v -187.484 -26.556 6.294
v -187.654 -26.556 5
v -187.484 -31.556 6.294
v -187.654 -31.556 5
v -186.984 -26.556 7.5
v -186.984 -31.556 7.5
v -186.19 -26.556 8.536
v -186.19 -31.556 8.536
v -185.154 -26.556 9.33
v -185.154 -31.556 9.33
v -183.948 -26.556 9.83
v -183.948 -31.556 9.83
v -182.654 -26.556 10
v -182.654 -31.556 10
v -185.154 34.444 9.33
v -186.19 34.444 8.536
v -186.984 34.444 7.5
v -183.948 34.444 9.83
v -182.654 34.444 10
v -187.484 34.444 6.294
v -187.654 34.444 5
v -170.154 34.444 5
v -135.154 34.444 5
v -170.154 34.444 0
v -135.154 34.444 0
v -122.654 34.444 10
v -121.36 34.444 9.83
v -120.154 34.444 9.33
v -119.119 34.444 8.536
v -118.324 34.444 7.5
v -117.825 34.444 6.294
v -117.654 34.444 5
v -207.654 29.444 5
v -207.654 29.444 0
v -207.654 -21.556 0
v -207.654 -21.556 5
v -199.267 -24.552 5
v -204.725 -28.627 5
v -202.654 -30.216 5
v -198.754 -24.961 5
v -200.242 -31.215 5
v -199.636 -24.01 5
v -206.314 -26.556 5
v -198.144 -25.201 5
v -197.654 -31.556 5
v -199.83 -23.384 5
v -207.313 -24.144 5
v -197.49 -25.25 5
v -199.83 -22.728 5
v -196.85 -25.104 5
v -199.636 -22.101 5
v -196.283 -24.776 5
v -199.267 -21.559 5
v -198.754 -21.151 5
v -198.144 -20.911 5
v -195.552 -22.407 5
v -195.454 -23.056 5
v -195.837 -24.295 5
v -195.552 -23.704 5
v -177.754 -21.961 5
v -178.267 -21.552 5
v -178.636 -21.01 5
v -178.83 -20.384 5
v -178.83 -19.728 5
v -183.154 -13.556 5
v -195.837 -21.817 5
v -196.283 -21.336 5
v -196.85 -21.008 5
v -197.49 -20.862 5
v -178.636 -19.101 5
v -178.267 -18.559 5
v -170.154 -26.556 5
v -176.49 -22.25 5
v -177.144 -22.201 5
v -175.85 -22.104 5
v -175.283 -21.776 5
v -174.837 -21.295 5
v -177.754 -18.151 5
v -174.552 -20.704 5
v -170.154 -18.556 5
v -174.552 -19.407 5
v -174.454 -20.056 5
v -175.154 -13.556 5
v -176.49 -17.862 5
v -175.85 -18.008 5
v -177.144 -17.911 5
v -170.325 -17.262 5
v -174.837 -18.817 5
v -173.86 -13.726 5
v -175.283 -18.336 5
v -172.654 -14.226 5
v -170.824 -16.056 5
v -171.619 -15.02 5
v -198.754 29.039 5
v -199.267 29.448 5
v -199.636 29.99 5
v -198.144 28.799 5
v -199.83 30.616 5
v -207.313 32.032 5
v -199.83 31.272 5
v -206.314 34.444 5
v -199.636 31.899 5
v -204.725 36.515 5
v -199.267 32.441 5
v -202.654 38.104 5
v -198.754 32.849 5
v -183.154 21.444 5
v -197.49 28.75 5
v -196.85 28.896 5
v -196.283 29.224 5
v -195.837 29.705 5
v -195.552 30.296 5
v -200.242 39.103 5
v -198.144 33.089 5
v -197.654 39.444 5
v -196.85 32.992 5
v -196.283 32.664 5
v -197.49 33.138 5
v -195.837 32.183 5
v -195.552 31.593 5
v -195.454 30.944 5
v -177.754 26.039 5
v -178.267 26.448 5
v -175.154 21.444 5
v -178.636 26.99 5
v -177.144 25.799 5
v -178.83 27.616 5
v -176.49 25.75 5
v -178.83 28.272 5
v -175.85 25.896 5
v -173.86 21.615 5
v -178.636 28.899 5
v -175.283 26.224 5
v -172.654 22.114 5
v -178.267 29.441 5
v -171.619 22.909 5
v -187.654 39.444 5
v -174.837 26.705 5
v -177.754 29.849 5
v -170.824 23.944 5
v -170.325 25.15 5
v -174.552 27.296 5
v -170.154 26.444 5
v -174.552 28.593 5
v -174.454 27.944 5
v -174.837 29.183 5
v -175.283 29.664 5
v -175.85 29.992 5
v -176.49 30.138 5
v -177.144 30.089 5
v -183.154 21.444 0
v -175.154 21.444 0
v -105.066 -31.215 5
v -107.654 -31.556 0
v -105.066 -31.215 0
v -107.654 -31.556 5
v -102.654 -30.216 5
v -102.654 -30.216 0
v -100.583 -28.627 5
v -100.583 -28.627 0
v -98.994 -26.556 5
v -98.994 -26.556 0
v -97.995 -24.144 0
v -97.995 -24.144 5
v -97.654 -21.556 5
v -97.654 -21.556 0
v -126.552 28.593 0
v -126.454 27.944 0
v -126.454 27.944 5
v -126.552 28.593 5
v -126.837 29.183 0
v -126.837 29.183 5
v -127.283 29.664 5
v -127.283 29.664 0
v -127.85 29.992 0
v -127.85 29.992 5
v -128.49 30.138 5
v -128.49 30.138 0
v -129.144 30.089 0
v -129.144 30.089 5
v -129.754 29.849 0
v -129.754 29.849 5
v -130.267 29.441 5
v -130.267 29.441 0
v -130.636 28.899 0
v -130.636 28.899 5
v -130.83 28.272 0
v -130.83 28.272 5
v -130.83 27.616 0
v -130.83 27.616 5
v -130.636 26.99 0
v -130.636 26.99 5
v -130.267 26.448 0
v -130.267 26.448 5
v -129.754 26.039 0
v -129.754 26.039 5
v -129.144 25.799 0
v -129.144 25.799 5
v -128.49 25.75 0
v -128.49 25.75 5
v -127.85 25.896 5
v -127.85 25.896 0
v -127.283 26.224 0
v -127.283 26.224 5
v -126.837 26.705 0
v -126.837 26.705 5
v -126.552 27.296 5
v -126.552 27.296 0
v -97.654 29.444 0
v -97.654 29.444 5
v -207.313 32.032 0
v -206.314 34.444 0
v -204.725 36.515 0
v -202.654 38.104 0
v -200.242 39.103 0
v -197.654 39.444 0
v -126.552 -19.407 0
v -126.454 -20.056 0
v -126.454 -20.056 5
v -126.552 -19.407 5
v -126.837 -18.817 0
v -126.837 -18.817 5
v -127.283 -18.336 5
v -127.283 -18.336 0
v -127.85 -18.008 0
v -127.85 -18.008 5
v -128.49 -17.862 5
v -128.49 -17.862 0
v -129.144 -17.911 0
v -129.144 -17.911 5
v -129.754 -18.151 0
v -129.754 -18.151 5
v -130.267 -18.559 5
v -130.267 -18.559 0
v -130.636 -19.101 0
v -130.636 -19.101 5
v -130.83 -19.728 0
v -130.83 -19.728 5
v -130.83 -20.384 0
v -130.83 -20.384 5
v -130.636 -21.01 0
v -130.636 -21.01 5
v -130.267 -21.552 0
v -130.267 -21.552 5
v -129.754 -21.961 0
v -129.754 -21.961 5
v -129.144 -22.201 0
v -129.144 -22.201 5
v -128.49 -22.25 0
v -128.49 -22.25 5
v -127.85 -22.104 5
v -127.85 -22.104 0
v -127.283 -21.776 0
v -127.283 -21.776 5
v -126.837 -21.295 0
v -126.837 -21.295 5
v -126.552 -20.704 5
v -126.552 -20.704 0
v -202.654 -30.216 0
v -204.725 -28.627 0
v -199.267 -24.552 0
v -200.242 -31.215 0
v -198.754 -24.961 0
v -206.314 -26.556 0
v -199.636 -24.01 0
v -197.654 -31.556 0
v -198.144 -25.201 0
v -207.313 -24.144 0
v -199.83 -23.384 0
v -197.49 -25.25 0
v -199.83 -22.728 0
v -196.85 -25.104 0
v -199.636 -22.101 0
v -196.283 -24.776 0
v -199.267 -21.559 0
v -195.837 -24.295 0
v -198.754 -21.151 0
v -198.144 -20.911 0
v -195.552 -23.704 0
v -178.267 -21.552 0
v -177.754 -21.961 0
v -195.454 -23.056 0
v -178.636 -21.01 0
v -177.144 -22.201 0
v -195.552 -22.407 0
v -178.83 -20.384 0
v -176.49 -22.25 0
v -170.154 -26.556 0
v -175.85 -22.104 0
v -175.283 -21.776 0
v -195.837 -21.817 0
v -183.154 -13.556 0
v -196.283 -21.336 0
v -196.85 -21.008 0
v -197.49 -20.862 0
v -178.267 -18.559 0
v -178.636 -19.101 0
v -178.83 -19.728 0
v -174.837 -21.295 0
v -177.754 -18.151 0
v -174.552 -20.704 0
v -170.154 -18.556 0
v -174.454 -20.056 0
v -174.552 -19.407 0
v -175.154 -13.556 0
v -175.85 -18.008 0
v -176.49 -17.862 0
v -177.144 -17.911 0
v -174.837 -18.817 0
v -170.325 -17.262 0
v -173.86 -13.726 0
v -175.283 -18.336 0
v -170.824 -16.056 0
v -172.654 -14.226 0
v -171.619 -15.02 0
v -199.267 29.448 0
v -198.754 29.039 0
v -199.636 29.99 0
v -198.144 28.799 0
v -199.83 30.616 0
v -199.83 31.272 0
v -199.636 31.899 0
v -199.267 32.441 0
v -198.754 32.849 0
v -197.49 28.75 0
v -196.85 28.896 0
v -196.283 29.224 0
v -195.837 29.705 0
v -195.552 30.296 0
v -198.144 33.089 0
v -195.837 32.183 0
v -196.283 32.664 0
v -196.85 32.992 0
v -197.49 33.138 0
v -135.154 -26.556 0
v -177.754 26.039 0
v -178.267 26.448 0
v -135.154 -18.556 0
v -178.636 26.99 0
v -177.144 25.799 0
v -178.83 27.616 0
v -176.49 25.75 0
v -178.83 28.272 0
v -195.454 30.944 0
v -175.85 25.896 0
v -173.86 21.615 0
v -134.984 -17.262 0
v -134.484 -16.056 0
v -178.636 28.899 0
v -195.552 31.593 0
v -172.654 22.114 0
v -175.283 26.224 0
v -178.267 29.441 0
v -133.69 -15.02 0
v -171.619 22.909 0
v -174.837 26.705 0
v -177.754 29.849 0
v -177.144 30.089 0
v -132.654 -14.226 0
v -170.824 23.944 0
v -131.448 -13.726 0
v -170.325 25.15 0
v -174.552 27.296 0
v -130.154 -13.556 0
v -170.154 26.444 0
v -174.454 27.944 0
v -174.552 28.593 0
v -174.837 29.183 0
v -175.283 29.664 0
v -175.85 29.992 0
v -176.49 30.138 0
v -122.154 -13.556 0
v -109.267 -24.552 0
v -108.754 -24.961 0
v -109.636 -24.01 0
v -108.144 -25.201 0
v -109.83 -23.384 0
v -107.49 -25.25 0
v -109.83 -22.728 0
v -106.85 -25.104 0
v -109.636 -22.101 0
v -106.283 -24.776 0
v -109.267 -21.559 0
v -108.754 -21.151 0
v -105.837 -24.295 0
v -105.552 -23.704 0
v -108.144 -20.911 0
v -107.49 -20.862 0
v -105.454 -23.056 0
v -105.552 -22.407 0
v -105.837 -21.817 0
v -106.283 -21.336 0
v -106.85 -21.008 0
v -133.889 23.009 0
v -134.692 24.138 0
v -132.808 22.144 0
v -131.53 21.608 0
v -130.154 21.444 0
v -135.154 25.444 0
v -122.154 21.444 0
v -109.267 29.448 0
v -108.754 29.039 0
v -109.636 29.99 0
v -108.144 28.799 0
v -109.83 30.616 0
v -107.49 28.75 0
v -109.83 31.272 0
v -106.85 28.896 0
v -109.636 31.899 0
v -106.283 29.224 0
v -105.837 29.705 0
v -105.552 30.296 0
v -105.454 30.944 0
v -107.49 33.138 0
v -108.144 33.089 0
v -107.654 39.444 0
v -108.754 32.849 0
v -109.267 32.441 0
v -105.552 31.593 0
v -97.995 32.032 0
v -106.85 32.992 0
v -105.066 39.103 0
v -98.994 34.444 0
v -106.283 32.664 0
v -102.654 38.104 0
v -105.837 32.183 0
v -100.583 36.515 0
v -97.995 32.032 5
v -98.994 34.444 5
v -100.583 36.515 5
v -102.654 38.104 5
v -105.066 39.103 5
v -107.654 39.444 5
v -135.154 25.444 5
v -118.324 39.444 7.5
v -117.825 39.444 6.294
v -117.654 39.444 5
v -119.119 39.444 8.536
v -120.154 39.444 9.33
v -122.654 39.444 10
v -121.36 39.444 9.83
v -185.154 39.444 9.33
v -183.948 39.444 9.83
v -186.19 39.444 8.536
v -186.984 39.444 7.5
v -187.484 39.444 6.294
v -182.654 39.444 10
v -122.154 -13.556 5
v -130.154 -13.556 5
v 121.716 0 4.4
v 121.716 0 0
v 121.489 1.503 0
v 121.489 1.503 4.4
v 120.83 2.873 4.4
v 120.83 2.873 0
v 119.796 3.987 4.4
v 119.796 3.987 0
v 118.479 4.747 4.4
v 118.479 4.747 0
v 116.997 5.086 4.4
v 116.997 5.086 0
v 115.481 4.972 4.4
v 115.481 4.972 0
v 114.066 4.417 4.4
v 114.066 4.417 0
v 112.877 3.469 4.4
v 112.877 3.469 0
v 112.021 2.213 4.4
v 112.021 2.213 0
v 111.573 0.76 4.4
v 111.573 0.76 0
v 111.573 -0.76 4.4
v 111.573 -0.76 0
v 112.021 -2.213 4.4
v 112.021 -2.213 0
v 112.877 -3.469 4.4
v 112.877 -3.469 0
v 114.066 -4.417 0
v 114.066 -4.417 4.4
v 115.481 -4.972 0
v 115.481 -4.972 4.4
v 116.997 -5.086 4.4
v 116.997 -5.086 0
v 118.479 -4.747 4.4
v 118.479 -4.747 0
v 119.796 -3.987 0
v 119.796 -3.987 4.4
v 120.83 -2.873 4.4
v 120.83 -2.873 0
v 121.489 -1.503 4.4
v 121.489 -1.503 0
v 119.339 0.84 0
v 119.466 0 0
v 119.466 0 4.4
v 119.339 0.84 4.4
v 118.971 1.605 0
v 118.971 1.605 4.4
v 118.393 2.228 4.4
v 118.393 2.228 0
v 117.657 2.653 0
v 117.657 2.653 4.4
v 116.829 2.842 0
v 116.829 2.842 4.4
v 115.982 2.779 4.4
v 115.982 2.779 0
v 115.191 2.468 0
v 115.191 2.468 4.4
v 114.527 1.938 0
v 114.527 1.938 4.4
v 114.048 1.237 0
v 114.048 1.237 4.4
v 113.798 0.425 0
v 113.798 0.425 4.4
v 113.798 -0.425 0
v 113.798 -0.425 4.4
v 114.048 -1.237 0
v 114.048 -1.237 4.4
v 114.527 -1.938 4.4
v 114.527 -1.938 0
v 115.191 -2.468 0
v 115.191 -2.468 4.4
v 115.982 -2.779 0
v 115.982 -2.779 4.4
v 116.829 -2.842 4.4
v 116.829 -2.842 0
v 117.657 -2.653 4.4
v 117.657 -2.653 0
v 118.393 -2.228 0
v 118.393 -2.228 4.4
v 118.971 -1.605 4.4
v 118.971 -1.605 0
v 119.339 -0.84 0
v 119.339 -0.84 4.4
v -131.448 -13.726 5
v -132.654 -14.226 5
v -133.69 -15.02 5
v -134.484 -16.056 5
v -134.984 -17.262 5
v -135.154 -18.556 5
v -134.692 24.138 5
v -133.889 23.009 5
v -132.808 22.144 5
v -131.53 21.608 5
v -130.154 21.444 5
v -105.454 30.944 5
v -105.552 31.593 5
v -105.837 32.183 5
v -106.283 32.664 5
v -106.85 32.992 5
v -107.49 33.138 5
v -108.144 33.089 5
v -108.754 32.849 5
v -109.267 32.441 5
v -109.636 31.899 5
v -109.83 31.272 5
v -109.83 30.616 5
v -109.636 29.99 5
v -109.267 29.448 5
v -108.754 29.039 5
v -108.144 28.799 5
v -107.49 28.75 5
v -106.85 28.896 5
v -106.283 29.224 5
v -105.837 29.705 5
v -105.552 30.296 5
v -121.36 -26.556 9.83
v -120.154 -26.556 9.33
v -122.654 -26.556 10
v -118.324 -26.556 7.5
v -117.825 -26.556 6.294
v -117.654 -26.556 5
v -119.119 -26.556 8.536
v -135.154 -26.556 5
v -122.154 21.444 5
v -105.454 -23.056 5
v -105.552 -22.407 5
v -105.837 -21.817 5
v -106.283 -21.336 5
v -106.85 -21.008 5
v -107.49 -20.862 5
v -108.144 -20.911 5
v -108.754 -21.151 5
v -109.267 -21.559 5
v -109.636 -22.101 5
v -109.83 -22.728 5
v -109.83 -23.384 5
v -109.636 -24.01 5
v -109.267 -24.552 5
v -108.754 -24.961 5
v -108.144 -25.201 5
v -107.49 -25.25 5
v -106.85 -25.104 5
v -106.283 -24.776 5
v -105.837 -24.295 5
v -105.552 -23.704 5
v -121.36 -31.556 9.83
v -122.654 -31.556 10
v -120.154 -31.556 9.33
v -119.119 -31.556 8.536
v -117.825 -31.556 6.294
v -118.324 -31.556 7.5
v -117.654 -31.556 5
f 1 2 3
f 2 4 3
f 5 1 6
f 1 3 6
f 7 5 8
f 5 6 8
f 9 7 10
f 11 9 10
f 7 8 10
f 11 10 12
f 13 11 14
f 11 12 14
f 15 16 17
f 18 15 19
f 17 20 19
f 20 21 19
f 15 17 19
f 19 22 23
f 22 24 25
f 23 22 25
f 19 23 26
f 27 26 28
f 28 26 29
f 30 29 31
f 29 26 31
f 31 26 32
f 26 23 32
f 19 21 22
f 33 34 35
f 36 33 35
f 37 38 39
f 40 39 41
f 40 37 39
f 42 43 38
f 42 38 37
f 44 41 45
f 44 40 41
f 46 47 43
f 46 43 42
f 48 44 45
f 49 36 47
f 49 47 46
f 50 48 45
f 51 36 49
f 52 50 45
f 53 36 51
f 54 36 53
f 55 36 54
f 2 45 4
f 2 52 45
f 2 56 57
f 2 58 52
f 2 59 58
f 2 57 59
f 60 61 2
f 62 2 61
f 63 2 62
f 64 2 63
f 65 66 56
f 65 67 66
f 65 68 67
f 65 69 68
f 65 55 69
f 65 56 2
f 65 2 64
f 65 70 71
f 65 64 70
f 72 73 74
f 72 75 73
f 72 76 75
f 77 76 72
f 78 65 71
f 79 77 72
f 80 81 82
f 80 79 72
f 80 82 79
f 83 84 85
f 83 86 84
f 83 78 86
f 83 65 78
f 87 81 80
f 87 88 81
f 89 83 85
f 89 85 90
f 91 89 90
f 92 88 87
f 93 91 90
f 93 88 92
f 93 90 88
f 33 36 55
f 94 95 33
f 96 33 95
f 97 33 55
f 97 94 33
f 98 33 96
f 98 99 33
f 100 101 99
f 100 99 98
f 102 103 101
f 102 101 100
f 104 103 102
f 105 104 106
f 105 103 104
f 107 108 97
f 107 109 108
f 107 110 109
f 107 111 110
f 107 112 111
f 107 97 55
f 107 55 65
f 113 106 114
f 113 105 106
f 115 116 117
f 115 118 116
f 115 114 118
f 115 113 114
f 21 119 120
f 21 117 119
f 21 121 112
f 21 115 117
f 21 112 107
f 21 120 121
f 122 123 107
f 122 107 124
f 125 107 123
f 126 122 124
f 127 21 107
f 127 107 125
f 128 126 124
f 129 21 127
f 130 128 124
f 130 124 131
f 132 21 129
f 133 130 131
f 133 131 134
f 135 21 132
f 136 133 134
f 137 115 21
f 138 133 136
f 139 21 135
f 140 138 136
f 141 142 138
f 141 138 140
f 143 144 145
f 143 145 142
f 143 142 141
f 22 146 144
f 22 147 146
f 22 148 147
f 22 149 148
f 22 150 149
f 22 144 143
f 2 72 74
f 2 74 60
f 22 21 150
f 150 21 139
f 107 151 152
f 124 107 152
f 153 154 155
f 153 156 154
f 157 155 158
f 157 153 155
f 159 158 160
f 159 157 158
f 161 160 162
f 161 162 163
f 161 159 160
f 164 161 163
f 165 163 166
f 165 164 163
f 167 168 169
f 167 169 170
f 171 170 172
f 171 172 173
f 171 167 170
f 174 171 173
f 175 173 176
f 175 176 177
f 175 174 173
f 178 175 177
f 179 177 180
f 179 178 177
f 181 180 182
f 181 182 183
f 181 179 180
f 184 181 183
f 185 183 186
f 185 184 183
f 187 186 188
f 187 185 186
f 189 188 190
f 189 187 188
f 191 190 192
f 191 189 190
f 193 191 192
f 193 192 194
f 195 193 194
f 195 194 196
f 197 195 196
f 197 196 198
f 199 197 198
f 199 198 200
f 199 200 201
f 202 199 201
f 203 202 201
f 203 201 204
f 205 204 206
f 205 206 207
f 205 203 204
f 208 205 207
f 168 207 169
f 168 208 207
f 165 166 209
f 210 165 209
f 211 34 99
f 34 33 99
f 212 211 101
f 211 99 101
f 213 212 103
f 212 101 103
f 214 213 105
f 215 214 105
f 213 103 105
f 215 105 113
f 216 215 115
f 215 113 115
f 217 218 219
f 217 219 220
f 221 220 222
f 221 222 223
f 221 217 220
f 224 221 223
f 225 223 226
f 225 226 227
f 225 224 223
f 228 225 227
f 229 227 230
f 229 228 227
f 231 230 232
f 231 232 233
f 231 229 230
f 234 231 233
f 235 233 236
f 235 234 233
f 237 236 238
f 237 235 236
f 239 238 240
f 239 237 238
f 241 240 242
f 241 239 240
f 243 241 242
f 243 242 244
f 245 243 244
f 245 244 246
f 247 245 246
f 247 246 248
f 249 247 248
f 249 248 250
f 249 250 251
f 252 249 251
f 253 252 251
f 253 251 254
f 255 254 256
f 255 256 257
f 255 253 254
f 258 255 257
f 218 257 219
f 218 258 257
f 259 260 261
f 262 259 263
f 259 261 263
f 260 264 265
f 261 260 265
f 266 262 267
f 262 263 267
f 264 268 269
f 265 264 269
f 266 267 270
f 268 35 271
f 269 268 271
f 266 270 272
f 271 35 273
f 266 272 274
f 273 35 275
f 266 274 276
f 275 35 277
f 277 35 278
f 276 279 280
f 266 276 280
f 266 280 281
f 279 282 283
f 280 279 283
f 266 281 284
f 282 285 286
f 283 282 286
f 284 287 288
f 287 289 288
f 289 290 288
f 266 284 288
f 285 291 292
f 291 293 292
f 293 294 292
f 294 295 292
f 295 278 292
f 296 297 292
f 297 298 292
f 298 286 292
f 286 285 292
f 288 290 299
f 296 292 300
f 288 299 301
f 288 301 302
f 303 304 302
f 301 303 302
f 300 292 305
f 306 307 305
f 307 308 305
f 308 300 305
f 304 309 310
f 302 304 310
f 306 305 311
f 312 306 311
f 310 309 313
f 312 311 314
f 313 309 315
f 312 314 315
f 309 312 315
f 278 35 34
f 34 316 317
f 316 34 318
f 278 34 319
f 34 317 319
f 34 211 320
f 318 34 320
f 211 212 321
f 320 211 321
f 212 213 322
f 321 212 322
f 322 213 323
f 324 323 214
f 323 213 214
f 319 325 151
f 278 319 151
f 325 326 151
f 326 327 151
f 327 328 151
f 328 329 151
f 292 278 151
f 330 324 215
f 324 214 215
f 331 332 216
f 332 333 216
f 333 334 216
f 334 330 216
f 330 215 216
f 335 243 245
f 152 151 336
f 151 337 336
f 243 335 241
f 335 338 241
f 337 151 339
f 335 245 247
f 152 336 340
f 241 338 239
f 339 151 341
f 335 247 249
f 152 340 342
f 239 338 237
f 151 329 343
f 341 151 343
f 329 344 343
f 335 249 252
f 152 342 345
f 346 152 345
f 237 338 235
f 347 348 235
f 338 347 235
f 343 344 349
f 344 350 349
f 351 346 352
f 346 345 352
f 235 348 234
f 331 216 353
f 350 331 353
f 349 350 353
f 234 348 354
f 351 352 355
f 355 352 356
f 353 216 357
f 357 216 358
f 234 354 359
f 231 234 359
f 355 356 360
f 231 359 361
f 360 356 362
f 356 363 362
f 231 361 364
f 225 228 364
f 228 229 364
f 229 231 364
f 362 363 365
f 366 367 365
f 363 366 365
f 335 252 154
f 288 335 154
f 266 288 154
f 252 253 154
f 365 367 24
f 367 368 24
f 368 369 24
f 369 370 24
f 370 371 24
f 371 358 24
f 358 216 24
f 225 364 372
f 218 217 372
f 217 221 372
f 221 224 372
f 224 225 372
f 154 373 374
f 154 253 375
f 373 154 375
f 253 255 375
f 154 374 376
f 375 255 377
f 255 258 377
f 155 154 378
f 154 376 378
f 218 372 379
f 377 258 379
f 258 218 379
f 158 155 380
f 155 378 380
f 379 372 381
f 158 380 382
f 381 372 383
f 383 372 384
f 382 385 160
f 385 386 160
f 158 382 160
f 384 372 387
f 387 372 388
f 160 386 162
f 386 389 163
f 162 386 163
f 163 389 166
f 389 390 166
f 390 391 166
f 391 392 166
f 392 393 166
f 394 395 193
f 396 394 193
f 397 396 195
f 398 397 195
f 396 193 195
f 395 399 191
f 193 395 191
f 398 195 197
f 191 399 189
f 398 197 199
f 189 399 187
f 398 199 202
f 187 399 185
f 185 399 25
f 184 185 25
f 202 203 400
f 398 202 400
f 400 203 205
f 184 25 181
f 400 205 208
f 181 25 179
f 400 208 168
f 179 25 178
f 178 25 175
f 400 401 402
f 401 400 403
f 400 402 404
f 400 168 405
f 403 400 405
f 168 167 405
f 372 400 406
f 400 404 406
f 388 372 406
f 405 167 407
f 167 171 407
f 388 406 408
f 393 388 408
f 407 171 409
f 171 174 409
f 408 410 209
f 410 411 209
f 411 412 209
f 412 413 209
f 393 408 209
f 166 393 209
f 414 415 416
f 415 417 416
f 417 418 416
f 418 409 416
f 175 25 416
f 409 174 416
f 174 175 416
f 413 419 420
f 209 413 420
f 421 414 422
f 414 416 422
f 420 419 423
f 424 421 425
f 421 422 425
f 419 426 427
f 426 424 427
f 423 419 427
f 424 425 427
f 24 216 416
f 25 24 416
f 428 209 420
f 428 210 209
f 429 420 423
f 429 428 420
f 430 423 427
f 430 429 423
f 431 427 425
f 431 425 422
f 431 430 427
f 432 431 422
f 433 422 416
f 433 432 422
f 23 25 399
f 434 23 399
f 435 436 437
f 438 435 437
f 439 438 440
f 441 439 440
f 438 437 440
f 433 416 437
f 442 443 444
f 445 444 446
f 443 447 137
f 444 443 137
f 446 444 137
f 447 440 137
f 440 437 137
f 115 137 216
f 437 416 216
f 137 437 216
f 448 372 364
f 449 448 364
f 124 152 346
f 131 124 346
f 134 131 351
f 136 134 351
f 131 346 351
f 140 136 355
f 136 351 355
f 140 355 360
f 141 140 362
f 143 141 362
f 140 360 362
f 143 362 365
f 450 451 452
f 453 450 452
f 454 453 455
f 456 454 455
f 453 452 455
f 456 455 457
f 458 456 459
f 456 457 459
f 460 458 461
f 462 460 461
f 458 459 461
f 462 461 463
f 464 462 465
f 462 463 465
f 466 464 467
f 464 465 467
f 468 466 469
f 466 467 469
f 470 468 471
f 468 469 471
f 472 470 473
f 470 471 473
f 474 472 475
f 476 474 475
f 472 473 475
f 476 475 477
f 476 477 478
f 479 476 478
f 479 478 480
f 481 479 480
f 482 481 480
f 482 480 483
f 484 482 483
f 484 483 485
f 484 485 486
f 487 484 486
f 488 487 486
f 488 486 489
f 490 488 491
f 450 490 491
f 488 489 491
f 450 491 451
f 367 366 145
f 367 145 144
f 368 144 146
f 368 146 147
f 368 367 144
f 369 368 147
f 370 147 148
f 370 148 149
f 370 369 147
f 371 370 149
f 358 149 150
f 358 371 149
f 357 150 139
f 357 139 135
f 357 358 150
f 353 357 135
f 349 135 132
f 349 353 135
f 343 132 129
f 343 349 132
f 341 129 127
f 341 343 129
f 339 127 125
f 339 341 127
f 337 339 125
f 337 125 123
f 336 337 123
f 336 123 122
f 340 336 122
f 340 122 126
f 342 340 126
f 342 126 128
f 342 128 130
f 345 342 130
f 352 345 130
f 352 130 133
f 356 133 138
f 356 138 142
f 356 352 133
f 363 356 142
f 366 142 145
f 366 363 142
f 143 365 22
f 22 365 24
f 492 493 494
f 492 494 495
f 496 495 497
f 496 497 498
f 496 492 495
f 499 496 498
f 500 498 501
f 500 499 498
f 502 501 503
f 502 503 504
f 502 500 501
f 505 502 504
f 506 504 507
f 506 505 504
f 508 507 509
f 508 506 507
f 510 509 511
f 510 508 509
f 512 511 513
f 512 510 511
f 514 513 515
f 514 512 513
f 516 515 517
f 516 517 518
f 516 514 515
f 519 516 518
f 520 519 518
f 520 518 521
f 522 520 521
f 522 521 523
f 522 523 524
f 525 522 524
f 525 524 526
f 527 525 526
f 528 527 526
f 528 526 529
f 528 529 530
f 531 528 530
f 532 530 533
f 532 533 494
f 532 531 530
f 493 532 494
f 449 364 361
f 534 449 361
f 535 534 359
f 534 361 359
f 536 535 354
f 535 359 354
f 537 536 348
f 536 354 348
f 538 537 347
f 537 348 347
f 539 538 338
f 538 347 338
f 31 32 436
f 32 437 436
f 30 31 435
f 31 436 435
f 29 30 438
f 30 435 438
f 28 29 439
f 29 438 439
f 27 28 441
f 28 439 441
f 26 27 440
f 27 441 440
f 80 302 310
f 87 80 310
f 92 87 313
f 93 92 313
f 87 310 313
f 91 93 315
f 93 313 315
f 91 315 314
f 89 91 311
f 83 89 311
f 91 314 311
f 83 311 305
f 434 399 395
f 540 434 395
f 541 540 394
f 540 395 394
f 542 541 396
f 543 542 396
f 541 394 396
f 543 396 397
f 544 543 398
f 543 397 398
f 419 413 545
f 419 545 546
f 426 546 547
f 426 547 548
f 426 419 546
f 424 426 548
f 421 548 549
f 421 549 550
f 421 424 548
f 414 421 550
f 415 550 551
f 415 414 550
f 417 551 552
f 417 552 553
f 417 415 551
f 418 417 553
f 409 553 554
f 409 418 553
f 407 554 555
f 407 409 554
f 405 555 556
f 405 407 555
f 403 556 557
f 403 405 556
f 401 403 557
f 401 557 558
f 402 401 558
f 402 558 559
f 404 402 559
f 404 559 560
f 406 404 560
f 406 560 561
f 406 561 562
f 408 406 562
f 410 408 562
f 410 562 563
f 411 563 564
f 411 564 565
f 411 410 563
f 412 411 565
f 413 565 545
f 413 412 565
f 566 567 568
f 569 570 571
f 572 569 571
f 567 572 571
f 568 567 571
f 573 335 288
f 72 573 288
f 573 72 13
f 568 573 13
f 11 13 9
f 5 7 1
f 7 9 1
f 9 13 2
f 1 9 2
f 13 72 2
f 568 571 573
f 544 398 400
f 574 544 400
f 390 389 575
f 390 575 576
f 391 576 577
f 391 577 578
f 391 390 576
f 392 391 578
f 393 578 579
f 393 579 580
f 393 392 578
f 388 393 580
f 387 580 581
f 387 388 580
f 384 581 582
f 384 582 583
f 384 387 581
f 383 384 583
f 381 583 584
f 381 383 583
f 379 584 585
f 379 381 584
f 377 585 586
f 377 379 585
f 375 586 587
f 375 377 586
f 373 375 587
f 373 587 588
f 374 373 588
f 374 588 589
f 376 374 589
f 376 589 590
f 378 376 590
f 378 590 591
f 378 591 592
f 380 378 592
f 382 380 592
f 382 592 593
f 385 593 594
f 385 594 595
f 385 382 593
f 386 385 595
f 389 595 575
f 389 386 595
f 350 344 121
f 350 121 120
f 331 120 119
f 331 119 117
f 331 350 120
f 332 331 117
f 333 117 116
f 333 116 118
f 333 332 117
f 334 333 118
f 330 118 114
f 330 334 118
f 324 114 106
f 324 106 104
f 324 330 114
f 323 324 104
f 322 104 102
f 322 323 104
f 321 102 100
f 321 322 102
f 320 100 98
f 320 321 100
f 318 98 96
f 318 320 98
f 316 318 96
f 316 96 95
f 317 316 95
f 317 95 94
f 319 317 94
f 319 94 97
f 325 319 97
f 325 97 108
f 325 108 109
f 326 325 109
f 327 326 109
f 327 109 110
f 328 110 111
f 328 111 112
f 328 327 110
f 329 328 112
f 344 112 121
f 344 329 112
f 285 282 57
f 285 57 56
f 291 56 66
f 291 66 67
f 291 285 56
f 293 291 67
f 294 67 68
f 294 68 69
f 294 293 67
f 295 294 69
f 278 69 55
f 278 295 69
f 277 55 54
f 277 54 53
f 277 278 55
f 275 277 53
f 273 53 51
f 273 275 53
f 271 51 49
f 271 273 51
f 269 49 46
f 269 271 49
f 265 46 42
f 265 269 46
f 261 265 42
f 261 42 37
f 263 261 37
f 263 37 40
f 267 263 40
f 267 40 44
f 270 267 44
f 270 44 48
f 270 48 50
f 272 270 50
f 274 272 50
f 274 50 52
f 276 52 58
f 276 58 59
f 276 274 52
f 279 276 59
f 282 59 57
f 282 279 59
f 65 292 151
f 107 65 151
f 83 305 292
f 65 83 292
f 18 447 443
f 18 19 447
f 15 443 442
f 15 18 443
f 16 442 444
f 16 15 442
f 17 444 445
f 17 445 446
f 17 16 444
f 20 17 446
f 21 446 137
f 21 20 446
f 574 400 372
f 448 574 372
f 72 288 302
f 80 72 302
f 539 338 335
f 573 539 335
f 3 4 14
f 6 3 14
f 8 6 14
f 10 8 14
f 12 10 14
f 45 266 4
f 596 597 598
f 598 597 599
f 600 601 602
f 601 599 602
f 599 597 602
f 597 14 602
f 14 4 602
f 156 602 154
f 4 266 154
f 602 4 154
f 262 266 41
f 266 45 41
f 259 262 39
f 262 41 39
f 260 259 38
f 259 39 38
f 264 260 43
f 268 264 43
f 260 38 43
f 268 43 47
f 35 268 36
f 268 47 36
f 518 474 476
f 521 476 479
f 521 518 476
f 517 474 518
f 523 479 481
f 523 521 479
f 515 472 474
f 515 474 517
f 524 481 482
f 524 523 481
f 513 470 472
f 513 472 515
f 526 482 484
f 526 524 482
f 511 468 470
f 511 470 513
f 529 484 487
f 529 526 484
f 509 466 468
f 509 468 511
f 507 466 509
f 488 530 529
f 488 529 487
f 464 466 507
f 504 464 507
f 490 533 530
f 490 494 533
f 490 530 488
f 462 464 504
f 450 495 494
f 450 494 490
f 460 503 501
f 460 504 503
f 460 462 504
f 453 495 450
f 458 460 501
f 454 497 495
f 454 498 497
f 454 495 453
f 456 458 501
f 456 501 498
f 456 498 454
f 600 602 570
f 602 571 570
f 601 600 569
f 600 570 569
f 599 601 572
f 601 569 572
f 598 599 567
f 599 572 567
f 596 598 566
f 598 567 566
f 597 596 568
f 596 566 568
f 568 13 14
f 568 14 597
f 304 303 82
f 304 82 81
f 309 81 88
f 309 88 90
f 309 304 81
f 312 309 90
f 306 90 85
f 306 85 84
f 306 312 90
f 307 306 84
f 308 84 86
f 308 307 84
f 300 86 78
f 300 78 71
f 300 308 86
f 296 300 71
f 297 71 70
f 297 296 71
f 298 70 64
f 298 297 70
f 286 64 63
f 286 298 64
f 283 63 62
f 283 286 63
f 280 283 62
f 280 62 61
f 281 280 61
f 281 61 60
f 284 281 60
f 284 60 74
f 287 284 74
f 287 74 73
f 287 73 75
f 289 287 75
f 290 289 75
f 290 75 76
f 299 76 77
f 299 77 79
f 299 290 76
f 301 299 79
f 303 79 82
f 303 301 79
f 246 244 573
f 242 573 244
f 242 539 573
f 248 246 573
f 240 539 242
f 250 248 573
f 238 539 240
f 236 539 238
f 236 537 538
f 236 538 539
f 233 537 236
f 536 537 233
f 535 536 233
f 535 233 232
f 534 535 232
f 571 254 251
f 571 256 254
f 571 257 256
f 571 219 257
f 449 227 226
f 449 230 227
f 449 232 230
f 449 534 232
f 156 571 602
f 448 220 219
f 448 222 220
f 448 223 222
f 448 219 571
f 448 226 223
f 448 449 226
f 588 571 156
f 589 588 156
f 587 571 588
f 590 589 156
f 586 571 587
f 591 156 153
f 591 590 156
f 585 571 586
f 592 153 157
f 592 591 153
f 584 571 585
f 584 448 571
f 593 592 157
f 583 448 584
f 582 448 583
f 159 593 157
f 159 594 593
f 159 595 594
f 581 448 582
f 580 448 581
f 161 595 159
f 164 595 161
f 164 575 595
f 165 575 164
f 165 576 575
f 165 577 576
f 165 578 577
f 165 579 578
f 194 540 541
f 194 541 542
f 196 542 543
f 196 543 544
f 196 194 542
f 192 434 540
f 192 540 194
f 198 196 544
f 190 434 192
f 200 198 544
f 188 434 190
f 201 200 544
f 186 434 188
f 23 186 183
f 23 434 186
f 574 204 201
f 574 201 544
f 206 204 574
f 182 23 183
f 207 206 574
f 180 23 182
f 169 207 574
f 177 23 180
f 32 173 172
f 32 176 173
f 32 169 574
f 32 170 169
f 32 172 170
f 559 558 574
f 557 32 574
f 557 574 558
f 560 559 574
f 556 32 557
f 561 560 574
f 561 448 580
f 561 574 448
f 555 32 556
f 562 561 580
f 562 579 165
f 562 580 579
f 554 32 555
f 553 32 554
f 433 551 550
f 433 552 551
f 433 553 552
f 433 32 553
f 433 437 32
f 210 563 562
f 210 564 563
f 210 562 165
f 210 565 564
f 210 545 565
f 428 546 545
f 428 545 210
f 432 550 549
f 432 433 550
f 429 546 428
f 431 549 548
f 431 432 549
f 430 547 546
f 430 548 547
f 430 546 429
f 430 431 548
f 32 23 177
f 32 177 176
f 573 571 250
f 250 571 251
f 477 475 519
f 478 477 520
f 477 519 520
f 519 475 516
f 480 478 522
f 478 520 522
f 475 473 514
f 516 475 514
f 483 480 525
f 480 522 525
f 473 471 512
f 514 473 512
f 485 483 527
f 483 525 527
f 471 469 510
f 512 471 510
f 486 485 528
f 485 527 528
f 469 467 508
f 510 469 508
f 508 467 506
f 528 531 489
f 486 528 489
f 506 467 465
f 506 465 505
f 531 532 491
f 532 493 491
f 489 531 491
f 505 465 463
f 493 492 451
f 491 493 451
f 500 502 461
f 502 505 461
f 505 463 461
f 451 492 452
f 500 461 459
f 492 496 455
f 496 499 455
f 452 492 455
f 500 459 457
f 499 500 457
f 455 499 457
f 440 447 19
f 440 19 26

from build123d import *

# Parameters (mm, degrees)
F0_R     = 2.2
F1_DEPTH = 5
F2_R     = 10
F4_DEPTH = 5
F5_R     = 4.99999
F6_R     = 5.1
F6_R_2   = 2.85
F7_DEPTH = 4.4


# Not quite as in the source:
# - a fillet or chamfer is up to 0.001 mm smaller than in the source, because OpenCascade refuses the exact size


with BuildPart() as f1:
    # F0 (on Top) → F1 (new body)
    with BuildSketch(Plane.XY):
        Polygon((-207.6542276144, -31.5558707826), (-152.6542276144, -31.5558707826), (-97.6542276144, -31.5558707826), (-97.6542276144, 39.4441292174), (-152.6542276144, 39.4441292174), (-207.6542276144, 39.4441292174), align=None)
        with Locations((-197.6542276144, -23.0558707826)):
            Circle(F0_R, mode=Mode.SUBTRACT)
        with Locations((-176.6542276144, -20.0558707826)):
            Circle(F0_R, mode=Mode.SUBTRACT)
        with Locations((-128.6542276144, -20.0558707826)):
            Circle(F0_R, mode=Mode.SUBTRACT)
        with Locations((-107.6542276144, -23.0558707826)):
            Circle(F0_R, mode=Mode.SUBTRACT)
        with Locations((-197.6542276144, 30.9441292174)):
            Circle(F0_R, mode=Mode.SUBTRACT)
        with Locations((-176.6542276144, 27.9441292174)):
            Circle(F0_R, mode=Mode.SUBTRACT)
        with BuildLine():
            Line((-175.1542276144, -13.5558707826), (-183.1542276144, -13.5558707826))
            Line((-183.1542276144, -13.5558707826), (-183.1542276144, 21.4441292174))
            Line((-183.1542276144, 21.4441292174), (-175.1542276144, 21.4441292174))
            ThreePointArc((-175.1542276144, 21.4441292174), (-171.6186937085, 22.9085953115), (-170.1542276144, 26.4441292174))
            Line((-170.1542276144, 26.4441292174), (-170.1542276144, 34.4441292174))
            Line((-170.1542276144, 34.4441292174), (-135.1542276144, 34.4441292174))
            Line((-135.1542276144, 34.4441292174), (-135.1542276144, 25.4441292174))
            ThreePointArc((-135.1542276144, 25.4441292174), (-133.3785159981, 22.5387687378), (-130.1542276144, 21.4441292174))
            Line((-130.1542276144, 21.4441292174), (-122.1542276144, 21.4441292174))
            Line((-122.1542276144, 21.4441292174), (-122.1542276144, -13.5558707826))
            Line((-122.1542276144, -13.5558707826), (-130.1542276144, -13.5558707826))
            ThreePointArc((-130.1542276144, -13.5558707826), (-133.6897615203, -15.0203368767), (-135.1542276144, -18.5558707826))
            Line((-135.1542276144, -18.5558707826), (-135.1542276144, -26.5558707826))
            Line((-135.1542276144, -26.5558707826), (-170.1542276144, -26.5558707826))
            Line((-170.1542276144, -26.5558707826), (-170.1542276144, -18.5558707826))
            ThreePointArc((-170.1542276144, -18.5558707826), (-171.6186937085, -15.0203368767), (-175.1542276144, -13.5558707826))
        make_face(mode=Mode.SUBTRACT)
        with Locations((-128.6542276144, 27.9441292174)):
            Circle(F0_R, mode=Mode.SUBTRACT)
        with Locations((-107.6542276144, 30.9441292174)):
            Circle(F0_R, mode=Mode.SUBTRACT)
    extrude(amount=F1_DEPTH)

    # F2
    f2_edges = [f1.edges().sort_by_distance(p)[0] for p in [
        (-207.654228, -31.555871, 2.5),
        (-207.654228, 39.444129, 2.5),
        (-97.654228, -31.555871, 2.5),
        (-97.654228, 39.444129, 2.5),
    ]]
    fillet(f2_edges, radius=F2_R)

    # F3 (on face) → F4 (join)
    with BuildSketch(Plane.XY.offset(5)):
        Polygon((-117.6542276144, 34.4441292174), (-117.6542276144, 39.4441292174), (-187.6542276144, 39.4441292174), (-187.6542276144, 34.4441292174), (-170.1542276144, 34.4441292174), (-135.1542276144, 34.4441292174), align=None)
        Polygon((-117.6542276144, -26.5558707826), (-135.1542276144, -26.5558707826), (-170.1542276144, -26.5558707826), (-187.6542276144, -26.5558707826), (-187.6542276144, -31.5558707826), (-117.6542276144, -31.5558707826), align=None)
    extrude(amount=F4_DEPTH)

    # F5 (radius 5 in the source; OpenCascade refuses exactly that, so slightly less here)
    f5_edges = [f1.edges().sort_by_distance(p)[0] for p in [
        (-187.654228, -29.055871, 10),
        (-117.654228, -29.055871, 10),
        (-117.654228, 36.944129, 10),
        (-187.654228, 36.944129, 10),
    ]]
    fillet(f5_edges, radius=F5_R)


with BuildPart() as f7:
    # F6 (on Top) → F7 (new body)
    with BuildSketch(Plane.XY):
        with Locations((116.6157959732, 0)):
            Circle(F6_R)
        with Locations((116.6157959732, 0)):
            Circle(F6_R_2, mode=Mode.SUBTRACT)
    extrude(amount=F7_DEPTH)


solid = Compound([f1.part, f7.part])
